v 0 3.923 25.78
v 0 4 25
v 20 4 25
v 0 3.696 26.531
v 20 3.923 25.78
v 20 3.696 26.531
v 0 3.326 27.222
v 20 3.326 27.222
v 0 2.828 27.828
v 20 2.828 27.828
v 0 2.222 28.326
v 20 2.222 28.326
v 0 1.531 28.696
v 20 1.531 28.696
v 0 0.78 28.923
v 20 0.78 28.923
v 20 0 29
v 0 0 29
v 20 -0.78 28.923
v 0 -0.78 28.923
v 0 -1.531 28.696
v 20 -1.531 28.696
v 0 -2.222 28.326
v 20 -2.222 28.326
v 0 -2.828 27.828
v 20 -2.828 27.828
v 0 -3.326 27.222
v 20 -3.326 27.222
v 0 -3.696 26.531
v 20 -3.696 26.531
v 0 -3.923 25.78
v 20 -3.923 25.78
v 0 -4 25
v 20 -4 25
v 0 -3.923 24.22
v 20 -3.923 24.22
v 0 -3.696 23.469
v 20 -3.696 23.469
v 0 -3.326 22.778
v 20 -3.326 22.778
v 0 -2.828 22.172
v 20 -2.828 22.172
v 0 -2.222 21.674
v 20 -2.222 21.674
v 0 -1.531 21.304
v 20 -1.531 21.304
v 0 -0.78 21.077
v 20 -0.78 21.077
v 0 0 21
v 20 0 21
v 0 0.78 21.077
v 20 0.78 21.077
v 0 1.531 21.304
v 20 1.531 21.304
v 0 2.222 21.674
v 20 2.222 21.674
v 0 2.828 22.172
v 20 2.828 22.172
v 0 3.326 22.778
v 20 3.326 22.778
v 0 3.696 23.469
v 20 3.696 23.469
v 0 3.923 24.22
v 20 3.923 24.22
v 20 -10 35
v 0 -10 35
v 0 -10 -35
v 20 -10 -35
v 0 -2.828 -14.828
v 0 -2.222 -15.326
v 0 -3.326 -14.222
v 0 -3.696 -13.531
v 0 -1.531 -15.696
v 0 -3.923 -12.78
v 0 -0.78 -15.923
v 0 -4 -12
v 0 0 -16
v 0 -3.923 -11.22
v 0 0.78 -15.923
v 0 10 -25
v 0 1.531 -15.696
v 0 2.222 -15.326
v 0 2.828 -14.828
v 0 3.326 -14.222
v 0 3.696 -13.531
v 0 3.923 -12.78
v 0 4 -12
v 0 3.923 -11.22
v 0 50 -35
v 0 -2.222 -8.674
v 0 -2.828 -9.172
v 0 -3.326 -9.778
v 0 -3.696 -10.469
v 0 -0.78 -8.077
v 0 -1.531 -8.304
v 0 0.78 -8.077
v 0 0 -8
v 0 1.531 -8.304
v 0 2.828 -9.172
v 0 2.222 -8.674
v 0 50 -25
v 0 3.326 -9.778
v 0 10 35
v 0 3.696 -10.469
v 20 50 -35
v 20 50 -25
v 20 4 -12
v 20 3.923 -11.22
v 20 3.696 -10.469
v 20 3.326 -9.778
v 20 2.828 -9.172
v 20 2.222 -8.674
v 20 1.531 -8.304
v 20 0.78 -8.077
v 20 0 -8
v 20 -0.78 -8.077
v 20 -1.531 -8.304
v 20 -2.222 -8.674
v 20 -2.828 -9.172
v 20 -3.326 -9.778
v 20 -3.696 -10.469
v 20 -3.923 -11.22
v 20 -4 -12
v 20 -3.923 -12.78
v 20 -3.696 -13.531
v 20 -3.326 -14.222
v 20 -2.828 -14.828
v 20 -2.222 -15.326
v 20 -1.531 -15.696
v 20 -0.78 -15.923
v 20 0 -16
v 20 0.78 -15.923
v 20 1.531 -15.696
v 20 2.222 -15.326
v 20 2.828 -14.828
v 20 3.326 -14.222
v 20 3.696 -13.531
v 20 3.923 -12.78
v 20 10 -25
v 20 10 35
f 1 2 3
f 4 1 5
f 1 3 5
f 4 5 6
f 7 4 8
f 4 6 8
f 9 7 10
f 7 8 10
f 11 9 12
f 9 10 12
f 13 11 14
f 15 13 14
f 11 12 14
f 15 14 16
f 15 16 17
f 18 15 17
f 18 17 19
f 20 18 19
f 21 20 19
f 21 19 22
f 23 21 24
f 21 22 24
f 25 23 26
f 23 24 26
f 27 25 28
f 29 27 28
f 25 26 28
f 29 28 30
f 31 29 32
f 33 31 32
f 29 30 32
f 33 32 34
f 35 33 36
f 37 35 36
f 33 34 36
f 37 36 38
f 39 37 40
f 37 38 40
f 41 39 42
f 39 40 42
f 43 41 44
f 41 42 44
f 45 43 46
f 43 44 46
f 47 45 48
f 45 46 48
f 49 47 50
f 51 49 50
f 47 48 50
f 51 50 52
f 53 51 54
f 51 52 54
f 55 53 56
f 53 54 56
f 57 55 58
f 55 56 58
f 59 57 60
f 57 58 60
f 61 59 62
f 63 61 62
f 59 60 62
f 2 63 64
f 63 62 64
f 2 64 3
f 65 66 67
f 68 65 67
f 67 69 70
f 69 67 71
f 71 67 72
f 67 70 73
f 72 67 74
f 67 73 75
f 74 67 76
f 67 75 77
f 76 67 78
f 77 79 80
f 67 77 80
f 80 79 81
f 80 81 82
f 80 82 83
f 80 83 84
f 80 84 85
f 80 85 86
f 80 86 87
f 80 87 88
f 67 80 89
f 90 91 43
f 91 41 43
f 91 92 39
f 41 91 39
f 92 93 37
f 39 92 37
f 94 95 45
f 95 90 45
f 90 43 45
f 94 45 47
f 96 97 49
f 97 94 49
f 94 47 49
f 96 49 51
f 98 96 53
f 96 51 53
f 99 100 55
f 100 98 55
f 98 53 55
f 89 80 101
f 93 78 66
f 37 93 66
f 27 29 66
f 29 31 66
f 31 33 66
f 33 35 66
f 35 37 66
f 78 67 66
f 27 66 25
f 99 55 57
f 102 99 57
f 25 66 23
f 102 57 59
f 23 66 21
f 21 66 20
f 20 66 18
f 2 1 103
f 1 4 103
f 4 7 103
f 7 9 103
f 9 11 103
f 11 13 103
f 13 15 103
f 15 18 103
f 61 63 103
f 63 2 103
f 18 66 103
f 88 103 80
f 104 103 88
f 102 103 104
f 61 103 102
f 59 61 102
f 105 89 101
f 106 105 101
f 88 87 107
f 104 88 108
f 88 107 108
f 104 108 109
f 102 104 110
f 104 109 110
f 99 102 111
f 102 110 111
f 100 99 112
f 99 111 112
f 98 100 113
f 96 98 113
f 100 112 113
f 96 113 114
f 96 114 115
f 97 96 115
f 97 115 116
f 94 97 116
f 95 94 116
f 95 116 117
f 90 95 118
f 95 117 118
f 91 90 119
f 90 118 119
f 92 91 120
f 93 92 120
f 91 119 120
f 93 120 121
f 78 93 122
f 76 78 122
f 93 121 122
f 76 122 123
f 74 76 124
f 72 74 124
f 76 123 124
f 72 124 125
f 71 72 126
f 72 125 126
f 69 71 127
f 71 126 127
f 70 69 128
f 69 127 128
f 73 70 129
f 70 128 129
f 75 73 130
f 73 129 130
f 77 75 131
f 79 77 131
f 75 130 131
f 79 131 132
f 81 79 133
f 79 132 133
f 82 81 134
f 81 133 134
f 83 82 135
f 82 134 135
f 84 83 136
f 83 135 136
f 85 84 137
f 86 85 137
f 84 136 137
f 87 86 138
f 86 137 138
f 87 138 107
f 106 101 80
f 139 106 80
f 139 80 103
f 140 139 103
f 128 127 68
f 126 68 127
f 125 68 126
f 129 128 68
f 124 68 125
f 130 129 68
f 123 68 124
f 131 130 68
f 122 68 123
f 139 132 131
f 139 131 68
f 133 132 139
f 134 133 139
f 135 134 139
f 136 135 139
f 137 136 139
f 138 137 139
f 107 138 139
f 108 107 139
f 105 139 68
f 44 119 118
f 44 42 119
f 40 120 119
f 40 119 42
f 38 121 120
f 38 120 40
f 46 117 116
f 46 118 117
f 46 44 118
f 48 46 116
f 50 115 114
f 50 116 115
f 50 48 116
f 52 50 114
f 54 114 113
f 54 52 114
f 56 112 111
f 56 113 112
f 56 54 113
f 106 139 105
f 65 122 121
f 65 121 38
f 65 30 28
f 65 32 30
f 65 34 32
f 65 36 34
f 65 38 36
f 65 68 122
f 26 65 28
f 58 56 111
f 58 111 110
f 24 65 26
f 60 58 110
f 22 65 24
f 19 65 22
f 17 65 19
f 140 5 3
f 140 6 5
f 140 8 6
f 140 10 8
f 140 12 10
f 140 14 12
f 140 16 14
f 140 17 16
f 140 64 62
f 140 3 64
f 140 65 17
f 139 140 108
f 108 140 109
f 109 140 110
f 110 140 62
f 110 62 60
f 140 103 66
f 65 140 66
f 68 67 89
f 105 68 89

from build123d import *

# Parameters (mm, degrees)
PAD_DEPTH    = 20
SKETCH001_R  = 4
POCKET_DEPTH = 20


with BuildPart() as part:
    # Sketch → Pad (new body)
    with BuildSketch(Plane.YZ):
        Polygon((-10, 35), (-10, -35), (50, -35), (50, -25), (10, -25), (10, 35), align=None)
    extrude(amount=PAD_DEPTH)

    # Sketch001 → Pocket (cut)
    with BuildSketch(Plane.YZ.offset(20)):
        with Locations((0, 25)):
            Circle(SKETCH001_R)
        with Locations((0, -12)):
            Circle(SKETCH001_R)
    extrude(amount=-POCKET_DEPTH, mode=Mode.SUBTRACT)


solid = part.part
